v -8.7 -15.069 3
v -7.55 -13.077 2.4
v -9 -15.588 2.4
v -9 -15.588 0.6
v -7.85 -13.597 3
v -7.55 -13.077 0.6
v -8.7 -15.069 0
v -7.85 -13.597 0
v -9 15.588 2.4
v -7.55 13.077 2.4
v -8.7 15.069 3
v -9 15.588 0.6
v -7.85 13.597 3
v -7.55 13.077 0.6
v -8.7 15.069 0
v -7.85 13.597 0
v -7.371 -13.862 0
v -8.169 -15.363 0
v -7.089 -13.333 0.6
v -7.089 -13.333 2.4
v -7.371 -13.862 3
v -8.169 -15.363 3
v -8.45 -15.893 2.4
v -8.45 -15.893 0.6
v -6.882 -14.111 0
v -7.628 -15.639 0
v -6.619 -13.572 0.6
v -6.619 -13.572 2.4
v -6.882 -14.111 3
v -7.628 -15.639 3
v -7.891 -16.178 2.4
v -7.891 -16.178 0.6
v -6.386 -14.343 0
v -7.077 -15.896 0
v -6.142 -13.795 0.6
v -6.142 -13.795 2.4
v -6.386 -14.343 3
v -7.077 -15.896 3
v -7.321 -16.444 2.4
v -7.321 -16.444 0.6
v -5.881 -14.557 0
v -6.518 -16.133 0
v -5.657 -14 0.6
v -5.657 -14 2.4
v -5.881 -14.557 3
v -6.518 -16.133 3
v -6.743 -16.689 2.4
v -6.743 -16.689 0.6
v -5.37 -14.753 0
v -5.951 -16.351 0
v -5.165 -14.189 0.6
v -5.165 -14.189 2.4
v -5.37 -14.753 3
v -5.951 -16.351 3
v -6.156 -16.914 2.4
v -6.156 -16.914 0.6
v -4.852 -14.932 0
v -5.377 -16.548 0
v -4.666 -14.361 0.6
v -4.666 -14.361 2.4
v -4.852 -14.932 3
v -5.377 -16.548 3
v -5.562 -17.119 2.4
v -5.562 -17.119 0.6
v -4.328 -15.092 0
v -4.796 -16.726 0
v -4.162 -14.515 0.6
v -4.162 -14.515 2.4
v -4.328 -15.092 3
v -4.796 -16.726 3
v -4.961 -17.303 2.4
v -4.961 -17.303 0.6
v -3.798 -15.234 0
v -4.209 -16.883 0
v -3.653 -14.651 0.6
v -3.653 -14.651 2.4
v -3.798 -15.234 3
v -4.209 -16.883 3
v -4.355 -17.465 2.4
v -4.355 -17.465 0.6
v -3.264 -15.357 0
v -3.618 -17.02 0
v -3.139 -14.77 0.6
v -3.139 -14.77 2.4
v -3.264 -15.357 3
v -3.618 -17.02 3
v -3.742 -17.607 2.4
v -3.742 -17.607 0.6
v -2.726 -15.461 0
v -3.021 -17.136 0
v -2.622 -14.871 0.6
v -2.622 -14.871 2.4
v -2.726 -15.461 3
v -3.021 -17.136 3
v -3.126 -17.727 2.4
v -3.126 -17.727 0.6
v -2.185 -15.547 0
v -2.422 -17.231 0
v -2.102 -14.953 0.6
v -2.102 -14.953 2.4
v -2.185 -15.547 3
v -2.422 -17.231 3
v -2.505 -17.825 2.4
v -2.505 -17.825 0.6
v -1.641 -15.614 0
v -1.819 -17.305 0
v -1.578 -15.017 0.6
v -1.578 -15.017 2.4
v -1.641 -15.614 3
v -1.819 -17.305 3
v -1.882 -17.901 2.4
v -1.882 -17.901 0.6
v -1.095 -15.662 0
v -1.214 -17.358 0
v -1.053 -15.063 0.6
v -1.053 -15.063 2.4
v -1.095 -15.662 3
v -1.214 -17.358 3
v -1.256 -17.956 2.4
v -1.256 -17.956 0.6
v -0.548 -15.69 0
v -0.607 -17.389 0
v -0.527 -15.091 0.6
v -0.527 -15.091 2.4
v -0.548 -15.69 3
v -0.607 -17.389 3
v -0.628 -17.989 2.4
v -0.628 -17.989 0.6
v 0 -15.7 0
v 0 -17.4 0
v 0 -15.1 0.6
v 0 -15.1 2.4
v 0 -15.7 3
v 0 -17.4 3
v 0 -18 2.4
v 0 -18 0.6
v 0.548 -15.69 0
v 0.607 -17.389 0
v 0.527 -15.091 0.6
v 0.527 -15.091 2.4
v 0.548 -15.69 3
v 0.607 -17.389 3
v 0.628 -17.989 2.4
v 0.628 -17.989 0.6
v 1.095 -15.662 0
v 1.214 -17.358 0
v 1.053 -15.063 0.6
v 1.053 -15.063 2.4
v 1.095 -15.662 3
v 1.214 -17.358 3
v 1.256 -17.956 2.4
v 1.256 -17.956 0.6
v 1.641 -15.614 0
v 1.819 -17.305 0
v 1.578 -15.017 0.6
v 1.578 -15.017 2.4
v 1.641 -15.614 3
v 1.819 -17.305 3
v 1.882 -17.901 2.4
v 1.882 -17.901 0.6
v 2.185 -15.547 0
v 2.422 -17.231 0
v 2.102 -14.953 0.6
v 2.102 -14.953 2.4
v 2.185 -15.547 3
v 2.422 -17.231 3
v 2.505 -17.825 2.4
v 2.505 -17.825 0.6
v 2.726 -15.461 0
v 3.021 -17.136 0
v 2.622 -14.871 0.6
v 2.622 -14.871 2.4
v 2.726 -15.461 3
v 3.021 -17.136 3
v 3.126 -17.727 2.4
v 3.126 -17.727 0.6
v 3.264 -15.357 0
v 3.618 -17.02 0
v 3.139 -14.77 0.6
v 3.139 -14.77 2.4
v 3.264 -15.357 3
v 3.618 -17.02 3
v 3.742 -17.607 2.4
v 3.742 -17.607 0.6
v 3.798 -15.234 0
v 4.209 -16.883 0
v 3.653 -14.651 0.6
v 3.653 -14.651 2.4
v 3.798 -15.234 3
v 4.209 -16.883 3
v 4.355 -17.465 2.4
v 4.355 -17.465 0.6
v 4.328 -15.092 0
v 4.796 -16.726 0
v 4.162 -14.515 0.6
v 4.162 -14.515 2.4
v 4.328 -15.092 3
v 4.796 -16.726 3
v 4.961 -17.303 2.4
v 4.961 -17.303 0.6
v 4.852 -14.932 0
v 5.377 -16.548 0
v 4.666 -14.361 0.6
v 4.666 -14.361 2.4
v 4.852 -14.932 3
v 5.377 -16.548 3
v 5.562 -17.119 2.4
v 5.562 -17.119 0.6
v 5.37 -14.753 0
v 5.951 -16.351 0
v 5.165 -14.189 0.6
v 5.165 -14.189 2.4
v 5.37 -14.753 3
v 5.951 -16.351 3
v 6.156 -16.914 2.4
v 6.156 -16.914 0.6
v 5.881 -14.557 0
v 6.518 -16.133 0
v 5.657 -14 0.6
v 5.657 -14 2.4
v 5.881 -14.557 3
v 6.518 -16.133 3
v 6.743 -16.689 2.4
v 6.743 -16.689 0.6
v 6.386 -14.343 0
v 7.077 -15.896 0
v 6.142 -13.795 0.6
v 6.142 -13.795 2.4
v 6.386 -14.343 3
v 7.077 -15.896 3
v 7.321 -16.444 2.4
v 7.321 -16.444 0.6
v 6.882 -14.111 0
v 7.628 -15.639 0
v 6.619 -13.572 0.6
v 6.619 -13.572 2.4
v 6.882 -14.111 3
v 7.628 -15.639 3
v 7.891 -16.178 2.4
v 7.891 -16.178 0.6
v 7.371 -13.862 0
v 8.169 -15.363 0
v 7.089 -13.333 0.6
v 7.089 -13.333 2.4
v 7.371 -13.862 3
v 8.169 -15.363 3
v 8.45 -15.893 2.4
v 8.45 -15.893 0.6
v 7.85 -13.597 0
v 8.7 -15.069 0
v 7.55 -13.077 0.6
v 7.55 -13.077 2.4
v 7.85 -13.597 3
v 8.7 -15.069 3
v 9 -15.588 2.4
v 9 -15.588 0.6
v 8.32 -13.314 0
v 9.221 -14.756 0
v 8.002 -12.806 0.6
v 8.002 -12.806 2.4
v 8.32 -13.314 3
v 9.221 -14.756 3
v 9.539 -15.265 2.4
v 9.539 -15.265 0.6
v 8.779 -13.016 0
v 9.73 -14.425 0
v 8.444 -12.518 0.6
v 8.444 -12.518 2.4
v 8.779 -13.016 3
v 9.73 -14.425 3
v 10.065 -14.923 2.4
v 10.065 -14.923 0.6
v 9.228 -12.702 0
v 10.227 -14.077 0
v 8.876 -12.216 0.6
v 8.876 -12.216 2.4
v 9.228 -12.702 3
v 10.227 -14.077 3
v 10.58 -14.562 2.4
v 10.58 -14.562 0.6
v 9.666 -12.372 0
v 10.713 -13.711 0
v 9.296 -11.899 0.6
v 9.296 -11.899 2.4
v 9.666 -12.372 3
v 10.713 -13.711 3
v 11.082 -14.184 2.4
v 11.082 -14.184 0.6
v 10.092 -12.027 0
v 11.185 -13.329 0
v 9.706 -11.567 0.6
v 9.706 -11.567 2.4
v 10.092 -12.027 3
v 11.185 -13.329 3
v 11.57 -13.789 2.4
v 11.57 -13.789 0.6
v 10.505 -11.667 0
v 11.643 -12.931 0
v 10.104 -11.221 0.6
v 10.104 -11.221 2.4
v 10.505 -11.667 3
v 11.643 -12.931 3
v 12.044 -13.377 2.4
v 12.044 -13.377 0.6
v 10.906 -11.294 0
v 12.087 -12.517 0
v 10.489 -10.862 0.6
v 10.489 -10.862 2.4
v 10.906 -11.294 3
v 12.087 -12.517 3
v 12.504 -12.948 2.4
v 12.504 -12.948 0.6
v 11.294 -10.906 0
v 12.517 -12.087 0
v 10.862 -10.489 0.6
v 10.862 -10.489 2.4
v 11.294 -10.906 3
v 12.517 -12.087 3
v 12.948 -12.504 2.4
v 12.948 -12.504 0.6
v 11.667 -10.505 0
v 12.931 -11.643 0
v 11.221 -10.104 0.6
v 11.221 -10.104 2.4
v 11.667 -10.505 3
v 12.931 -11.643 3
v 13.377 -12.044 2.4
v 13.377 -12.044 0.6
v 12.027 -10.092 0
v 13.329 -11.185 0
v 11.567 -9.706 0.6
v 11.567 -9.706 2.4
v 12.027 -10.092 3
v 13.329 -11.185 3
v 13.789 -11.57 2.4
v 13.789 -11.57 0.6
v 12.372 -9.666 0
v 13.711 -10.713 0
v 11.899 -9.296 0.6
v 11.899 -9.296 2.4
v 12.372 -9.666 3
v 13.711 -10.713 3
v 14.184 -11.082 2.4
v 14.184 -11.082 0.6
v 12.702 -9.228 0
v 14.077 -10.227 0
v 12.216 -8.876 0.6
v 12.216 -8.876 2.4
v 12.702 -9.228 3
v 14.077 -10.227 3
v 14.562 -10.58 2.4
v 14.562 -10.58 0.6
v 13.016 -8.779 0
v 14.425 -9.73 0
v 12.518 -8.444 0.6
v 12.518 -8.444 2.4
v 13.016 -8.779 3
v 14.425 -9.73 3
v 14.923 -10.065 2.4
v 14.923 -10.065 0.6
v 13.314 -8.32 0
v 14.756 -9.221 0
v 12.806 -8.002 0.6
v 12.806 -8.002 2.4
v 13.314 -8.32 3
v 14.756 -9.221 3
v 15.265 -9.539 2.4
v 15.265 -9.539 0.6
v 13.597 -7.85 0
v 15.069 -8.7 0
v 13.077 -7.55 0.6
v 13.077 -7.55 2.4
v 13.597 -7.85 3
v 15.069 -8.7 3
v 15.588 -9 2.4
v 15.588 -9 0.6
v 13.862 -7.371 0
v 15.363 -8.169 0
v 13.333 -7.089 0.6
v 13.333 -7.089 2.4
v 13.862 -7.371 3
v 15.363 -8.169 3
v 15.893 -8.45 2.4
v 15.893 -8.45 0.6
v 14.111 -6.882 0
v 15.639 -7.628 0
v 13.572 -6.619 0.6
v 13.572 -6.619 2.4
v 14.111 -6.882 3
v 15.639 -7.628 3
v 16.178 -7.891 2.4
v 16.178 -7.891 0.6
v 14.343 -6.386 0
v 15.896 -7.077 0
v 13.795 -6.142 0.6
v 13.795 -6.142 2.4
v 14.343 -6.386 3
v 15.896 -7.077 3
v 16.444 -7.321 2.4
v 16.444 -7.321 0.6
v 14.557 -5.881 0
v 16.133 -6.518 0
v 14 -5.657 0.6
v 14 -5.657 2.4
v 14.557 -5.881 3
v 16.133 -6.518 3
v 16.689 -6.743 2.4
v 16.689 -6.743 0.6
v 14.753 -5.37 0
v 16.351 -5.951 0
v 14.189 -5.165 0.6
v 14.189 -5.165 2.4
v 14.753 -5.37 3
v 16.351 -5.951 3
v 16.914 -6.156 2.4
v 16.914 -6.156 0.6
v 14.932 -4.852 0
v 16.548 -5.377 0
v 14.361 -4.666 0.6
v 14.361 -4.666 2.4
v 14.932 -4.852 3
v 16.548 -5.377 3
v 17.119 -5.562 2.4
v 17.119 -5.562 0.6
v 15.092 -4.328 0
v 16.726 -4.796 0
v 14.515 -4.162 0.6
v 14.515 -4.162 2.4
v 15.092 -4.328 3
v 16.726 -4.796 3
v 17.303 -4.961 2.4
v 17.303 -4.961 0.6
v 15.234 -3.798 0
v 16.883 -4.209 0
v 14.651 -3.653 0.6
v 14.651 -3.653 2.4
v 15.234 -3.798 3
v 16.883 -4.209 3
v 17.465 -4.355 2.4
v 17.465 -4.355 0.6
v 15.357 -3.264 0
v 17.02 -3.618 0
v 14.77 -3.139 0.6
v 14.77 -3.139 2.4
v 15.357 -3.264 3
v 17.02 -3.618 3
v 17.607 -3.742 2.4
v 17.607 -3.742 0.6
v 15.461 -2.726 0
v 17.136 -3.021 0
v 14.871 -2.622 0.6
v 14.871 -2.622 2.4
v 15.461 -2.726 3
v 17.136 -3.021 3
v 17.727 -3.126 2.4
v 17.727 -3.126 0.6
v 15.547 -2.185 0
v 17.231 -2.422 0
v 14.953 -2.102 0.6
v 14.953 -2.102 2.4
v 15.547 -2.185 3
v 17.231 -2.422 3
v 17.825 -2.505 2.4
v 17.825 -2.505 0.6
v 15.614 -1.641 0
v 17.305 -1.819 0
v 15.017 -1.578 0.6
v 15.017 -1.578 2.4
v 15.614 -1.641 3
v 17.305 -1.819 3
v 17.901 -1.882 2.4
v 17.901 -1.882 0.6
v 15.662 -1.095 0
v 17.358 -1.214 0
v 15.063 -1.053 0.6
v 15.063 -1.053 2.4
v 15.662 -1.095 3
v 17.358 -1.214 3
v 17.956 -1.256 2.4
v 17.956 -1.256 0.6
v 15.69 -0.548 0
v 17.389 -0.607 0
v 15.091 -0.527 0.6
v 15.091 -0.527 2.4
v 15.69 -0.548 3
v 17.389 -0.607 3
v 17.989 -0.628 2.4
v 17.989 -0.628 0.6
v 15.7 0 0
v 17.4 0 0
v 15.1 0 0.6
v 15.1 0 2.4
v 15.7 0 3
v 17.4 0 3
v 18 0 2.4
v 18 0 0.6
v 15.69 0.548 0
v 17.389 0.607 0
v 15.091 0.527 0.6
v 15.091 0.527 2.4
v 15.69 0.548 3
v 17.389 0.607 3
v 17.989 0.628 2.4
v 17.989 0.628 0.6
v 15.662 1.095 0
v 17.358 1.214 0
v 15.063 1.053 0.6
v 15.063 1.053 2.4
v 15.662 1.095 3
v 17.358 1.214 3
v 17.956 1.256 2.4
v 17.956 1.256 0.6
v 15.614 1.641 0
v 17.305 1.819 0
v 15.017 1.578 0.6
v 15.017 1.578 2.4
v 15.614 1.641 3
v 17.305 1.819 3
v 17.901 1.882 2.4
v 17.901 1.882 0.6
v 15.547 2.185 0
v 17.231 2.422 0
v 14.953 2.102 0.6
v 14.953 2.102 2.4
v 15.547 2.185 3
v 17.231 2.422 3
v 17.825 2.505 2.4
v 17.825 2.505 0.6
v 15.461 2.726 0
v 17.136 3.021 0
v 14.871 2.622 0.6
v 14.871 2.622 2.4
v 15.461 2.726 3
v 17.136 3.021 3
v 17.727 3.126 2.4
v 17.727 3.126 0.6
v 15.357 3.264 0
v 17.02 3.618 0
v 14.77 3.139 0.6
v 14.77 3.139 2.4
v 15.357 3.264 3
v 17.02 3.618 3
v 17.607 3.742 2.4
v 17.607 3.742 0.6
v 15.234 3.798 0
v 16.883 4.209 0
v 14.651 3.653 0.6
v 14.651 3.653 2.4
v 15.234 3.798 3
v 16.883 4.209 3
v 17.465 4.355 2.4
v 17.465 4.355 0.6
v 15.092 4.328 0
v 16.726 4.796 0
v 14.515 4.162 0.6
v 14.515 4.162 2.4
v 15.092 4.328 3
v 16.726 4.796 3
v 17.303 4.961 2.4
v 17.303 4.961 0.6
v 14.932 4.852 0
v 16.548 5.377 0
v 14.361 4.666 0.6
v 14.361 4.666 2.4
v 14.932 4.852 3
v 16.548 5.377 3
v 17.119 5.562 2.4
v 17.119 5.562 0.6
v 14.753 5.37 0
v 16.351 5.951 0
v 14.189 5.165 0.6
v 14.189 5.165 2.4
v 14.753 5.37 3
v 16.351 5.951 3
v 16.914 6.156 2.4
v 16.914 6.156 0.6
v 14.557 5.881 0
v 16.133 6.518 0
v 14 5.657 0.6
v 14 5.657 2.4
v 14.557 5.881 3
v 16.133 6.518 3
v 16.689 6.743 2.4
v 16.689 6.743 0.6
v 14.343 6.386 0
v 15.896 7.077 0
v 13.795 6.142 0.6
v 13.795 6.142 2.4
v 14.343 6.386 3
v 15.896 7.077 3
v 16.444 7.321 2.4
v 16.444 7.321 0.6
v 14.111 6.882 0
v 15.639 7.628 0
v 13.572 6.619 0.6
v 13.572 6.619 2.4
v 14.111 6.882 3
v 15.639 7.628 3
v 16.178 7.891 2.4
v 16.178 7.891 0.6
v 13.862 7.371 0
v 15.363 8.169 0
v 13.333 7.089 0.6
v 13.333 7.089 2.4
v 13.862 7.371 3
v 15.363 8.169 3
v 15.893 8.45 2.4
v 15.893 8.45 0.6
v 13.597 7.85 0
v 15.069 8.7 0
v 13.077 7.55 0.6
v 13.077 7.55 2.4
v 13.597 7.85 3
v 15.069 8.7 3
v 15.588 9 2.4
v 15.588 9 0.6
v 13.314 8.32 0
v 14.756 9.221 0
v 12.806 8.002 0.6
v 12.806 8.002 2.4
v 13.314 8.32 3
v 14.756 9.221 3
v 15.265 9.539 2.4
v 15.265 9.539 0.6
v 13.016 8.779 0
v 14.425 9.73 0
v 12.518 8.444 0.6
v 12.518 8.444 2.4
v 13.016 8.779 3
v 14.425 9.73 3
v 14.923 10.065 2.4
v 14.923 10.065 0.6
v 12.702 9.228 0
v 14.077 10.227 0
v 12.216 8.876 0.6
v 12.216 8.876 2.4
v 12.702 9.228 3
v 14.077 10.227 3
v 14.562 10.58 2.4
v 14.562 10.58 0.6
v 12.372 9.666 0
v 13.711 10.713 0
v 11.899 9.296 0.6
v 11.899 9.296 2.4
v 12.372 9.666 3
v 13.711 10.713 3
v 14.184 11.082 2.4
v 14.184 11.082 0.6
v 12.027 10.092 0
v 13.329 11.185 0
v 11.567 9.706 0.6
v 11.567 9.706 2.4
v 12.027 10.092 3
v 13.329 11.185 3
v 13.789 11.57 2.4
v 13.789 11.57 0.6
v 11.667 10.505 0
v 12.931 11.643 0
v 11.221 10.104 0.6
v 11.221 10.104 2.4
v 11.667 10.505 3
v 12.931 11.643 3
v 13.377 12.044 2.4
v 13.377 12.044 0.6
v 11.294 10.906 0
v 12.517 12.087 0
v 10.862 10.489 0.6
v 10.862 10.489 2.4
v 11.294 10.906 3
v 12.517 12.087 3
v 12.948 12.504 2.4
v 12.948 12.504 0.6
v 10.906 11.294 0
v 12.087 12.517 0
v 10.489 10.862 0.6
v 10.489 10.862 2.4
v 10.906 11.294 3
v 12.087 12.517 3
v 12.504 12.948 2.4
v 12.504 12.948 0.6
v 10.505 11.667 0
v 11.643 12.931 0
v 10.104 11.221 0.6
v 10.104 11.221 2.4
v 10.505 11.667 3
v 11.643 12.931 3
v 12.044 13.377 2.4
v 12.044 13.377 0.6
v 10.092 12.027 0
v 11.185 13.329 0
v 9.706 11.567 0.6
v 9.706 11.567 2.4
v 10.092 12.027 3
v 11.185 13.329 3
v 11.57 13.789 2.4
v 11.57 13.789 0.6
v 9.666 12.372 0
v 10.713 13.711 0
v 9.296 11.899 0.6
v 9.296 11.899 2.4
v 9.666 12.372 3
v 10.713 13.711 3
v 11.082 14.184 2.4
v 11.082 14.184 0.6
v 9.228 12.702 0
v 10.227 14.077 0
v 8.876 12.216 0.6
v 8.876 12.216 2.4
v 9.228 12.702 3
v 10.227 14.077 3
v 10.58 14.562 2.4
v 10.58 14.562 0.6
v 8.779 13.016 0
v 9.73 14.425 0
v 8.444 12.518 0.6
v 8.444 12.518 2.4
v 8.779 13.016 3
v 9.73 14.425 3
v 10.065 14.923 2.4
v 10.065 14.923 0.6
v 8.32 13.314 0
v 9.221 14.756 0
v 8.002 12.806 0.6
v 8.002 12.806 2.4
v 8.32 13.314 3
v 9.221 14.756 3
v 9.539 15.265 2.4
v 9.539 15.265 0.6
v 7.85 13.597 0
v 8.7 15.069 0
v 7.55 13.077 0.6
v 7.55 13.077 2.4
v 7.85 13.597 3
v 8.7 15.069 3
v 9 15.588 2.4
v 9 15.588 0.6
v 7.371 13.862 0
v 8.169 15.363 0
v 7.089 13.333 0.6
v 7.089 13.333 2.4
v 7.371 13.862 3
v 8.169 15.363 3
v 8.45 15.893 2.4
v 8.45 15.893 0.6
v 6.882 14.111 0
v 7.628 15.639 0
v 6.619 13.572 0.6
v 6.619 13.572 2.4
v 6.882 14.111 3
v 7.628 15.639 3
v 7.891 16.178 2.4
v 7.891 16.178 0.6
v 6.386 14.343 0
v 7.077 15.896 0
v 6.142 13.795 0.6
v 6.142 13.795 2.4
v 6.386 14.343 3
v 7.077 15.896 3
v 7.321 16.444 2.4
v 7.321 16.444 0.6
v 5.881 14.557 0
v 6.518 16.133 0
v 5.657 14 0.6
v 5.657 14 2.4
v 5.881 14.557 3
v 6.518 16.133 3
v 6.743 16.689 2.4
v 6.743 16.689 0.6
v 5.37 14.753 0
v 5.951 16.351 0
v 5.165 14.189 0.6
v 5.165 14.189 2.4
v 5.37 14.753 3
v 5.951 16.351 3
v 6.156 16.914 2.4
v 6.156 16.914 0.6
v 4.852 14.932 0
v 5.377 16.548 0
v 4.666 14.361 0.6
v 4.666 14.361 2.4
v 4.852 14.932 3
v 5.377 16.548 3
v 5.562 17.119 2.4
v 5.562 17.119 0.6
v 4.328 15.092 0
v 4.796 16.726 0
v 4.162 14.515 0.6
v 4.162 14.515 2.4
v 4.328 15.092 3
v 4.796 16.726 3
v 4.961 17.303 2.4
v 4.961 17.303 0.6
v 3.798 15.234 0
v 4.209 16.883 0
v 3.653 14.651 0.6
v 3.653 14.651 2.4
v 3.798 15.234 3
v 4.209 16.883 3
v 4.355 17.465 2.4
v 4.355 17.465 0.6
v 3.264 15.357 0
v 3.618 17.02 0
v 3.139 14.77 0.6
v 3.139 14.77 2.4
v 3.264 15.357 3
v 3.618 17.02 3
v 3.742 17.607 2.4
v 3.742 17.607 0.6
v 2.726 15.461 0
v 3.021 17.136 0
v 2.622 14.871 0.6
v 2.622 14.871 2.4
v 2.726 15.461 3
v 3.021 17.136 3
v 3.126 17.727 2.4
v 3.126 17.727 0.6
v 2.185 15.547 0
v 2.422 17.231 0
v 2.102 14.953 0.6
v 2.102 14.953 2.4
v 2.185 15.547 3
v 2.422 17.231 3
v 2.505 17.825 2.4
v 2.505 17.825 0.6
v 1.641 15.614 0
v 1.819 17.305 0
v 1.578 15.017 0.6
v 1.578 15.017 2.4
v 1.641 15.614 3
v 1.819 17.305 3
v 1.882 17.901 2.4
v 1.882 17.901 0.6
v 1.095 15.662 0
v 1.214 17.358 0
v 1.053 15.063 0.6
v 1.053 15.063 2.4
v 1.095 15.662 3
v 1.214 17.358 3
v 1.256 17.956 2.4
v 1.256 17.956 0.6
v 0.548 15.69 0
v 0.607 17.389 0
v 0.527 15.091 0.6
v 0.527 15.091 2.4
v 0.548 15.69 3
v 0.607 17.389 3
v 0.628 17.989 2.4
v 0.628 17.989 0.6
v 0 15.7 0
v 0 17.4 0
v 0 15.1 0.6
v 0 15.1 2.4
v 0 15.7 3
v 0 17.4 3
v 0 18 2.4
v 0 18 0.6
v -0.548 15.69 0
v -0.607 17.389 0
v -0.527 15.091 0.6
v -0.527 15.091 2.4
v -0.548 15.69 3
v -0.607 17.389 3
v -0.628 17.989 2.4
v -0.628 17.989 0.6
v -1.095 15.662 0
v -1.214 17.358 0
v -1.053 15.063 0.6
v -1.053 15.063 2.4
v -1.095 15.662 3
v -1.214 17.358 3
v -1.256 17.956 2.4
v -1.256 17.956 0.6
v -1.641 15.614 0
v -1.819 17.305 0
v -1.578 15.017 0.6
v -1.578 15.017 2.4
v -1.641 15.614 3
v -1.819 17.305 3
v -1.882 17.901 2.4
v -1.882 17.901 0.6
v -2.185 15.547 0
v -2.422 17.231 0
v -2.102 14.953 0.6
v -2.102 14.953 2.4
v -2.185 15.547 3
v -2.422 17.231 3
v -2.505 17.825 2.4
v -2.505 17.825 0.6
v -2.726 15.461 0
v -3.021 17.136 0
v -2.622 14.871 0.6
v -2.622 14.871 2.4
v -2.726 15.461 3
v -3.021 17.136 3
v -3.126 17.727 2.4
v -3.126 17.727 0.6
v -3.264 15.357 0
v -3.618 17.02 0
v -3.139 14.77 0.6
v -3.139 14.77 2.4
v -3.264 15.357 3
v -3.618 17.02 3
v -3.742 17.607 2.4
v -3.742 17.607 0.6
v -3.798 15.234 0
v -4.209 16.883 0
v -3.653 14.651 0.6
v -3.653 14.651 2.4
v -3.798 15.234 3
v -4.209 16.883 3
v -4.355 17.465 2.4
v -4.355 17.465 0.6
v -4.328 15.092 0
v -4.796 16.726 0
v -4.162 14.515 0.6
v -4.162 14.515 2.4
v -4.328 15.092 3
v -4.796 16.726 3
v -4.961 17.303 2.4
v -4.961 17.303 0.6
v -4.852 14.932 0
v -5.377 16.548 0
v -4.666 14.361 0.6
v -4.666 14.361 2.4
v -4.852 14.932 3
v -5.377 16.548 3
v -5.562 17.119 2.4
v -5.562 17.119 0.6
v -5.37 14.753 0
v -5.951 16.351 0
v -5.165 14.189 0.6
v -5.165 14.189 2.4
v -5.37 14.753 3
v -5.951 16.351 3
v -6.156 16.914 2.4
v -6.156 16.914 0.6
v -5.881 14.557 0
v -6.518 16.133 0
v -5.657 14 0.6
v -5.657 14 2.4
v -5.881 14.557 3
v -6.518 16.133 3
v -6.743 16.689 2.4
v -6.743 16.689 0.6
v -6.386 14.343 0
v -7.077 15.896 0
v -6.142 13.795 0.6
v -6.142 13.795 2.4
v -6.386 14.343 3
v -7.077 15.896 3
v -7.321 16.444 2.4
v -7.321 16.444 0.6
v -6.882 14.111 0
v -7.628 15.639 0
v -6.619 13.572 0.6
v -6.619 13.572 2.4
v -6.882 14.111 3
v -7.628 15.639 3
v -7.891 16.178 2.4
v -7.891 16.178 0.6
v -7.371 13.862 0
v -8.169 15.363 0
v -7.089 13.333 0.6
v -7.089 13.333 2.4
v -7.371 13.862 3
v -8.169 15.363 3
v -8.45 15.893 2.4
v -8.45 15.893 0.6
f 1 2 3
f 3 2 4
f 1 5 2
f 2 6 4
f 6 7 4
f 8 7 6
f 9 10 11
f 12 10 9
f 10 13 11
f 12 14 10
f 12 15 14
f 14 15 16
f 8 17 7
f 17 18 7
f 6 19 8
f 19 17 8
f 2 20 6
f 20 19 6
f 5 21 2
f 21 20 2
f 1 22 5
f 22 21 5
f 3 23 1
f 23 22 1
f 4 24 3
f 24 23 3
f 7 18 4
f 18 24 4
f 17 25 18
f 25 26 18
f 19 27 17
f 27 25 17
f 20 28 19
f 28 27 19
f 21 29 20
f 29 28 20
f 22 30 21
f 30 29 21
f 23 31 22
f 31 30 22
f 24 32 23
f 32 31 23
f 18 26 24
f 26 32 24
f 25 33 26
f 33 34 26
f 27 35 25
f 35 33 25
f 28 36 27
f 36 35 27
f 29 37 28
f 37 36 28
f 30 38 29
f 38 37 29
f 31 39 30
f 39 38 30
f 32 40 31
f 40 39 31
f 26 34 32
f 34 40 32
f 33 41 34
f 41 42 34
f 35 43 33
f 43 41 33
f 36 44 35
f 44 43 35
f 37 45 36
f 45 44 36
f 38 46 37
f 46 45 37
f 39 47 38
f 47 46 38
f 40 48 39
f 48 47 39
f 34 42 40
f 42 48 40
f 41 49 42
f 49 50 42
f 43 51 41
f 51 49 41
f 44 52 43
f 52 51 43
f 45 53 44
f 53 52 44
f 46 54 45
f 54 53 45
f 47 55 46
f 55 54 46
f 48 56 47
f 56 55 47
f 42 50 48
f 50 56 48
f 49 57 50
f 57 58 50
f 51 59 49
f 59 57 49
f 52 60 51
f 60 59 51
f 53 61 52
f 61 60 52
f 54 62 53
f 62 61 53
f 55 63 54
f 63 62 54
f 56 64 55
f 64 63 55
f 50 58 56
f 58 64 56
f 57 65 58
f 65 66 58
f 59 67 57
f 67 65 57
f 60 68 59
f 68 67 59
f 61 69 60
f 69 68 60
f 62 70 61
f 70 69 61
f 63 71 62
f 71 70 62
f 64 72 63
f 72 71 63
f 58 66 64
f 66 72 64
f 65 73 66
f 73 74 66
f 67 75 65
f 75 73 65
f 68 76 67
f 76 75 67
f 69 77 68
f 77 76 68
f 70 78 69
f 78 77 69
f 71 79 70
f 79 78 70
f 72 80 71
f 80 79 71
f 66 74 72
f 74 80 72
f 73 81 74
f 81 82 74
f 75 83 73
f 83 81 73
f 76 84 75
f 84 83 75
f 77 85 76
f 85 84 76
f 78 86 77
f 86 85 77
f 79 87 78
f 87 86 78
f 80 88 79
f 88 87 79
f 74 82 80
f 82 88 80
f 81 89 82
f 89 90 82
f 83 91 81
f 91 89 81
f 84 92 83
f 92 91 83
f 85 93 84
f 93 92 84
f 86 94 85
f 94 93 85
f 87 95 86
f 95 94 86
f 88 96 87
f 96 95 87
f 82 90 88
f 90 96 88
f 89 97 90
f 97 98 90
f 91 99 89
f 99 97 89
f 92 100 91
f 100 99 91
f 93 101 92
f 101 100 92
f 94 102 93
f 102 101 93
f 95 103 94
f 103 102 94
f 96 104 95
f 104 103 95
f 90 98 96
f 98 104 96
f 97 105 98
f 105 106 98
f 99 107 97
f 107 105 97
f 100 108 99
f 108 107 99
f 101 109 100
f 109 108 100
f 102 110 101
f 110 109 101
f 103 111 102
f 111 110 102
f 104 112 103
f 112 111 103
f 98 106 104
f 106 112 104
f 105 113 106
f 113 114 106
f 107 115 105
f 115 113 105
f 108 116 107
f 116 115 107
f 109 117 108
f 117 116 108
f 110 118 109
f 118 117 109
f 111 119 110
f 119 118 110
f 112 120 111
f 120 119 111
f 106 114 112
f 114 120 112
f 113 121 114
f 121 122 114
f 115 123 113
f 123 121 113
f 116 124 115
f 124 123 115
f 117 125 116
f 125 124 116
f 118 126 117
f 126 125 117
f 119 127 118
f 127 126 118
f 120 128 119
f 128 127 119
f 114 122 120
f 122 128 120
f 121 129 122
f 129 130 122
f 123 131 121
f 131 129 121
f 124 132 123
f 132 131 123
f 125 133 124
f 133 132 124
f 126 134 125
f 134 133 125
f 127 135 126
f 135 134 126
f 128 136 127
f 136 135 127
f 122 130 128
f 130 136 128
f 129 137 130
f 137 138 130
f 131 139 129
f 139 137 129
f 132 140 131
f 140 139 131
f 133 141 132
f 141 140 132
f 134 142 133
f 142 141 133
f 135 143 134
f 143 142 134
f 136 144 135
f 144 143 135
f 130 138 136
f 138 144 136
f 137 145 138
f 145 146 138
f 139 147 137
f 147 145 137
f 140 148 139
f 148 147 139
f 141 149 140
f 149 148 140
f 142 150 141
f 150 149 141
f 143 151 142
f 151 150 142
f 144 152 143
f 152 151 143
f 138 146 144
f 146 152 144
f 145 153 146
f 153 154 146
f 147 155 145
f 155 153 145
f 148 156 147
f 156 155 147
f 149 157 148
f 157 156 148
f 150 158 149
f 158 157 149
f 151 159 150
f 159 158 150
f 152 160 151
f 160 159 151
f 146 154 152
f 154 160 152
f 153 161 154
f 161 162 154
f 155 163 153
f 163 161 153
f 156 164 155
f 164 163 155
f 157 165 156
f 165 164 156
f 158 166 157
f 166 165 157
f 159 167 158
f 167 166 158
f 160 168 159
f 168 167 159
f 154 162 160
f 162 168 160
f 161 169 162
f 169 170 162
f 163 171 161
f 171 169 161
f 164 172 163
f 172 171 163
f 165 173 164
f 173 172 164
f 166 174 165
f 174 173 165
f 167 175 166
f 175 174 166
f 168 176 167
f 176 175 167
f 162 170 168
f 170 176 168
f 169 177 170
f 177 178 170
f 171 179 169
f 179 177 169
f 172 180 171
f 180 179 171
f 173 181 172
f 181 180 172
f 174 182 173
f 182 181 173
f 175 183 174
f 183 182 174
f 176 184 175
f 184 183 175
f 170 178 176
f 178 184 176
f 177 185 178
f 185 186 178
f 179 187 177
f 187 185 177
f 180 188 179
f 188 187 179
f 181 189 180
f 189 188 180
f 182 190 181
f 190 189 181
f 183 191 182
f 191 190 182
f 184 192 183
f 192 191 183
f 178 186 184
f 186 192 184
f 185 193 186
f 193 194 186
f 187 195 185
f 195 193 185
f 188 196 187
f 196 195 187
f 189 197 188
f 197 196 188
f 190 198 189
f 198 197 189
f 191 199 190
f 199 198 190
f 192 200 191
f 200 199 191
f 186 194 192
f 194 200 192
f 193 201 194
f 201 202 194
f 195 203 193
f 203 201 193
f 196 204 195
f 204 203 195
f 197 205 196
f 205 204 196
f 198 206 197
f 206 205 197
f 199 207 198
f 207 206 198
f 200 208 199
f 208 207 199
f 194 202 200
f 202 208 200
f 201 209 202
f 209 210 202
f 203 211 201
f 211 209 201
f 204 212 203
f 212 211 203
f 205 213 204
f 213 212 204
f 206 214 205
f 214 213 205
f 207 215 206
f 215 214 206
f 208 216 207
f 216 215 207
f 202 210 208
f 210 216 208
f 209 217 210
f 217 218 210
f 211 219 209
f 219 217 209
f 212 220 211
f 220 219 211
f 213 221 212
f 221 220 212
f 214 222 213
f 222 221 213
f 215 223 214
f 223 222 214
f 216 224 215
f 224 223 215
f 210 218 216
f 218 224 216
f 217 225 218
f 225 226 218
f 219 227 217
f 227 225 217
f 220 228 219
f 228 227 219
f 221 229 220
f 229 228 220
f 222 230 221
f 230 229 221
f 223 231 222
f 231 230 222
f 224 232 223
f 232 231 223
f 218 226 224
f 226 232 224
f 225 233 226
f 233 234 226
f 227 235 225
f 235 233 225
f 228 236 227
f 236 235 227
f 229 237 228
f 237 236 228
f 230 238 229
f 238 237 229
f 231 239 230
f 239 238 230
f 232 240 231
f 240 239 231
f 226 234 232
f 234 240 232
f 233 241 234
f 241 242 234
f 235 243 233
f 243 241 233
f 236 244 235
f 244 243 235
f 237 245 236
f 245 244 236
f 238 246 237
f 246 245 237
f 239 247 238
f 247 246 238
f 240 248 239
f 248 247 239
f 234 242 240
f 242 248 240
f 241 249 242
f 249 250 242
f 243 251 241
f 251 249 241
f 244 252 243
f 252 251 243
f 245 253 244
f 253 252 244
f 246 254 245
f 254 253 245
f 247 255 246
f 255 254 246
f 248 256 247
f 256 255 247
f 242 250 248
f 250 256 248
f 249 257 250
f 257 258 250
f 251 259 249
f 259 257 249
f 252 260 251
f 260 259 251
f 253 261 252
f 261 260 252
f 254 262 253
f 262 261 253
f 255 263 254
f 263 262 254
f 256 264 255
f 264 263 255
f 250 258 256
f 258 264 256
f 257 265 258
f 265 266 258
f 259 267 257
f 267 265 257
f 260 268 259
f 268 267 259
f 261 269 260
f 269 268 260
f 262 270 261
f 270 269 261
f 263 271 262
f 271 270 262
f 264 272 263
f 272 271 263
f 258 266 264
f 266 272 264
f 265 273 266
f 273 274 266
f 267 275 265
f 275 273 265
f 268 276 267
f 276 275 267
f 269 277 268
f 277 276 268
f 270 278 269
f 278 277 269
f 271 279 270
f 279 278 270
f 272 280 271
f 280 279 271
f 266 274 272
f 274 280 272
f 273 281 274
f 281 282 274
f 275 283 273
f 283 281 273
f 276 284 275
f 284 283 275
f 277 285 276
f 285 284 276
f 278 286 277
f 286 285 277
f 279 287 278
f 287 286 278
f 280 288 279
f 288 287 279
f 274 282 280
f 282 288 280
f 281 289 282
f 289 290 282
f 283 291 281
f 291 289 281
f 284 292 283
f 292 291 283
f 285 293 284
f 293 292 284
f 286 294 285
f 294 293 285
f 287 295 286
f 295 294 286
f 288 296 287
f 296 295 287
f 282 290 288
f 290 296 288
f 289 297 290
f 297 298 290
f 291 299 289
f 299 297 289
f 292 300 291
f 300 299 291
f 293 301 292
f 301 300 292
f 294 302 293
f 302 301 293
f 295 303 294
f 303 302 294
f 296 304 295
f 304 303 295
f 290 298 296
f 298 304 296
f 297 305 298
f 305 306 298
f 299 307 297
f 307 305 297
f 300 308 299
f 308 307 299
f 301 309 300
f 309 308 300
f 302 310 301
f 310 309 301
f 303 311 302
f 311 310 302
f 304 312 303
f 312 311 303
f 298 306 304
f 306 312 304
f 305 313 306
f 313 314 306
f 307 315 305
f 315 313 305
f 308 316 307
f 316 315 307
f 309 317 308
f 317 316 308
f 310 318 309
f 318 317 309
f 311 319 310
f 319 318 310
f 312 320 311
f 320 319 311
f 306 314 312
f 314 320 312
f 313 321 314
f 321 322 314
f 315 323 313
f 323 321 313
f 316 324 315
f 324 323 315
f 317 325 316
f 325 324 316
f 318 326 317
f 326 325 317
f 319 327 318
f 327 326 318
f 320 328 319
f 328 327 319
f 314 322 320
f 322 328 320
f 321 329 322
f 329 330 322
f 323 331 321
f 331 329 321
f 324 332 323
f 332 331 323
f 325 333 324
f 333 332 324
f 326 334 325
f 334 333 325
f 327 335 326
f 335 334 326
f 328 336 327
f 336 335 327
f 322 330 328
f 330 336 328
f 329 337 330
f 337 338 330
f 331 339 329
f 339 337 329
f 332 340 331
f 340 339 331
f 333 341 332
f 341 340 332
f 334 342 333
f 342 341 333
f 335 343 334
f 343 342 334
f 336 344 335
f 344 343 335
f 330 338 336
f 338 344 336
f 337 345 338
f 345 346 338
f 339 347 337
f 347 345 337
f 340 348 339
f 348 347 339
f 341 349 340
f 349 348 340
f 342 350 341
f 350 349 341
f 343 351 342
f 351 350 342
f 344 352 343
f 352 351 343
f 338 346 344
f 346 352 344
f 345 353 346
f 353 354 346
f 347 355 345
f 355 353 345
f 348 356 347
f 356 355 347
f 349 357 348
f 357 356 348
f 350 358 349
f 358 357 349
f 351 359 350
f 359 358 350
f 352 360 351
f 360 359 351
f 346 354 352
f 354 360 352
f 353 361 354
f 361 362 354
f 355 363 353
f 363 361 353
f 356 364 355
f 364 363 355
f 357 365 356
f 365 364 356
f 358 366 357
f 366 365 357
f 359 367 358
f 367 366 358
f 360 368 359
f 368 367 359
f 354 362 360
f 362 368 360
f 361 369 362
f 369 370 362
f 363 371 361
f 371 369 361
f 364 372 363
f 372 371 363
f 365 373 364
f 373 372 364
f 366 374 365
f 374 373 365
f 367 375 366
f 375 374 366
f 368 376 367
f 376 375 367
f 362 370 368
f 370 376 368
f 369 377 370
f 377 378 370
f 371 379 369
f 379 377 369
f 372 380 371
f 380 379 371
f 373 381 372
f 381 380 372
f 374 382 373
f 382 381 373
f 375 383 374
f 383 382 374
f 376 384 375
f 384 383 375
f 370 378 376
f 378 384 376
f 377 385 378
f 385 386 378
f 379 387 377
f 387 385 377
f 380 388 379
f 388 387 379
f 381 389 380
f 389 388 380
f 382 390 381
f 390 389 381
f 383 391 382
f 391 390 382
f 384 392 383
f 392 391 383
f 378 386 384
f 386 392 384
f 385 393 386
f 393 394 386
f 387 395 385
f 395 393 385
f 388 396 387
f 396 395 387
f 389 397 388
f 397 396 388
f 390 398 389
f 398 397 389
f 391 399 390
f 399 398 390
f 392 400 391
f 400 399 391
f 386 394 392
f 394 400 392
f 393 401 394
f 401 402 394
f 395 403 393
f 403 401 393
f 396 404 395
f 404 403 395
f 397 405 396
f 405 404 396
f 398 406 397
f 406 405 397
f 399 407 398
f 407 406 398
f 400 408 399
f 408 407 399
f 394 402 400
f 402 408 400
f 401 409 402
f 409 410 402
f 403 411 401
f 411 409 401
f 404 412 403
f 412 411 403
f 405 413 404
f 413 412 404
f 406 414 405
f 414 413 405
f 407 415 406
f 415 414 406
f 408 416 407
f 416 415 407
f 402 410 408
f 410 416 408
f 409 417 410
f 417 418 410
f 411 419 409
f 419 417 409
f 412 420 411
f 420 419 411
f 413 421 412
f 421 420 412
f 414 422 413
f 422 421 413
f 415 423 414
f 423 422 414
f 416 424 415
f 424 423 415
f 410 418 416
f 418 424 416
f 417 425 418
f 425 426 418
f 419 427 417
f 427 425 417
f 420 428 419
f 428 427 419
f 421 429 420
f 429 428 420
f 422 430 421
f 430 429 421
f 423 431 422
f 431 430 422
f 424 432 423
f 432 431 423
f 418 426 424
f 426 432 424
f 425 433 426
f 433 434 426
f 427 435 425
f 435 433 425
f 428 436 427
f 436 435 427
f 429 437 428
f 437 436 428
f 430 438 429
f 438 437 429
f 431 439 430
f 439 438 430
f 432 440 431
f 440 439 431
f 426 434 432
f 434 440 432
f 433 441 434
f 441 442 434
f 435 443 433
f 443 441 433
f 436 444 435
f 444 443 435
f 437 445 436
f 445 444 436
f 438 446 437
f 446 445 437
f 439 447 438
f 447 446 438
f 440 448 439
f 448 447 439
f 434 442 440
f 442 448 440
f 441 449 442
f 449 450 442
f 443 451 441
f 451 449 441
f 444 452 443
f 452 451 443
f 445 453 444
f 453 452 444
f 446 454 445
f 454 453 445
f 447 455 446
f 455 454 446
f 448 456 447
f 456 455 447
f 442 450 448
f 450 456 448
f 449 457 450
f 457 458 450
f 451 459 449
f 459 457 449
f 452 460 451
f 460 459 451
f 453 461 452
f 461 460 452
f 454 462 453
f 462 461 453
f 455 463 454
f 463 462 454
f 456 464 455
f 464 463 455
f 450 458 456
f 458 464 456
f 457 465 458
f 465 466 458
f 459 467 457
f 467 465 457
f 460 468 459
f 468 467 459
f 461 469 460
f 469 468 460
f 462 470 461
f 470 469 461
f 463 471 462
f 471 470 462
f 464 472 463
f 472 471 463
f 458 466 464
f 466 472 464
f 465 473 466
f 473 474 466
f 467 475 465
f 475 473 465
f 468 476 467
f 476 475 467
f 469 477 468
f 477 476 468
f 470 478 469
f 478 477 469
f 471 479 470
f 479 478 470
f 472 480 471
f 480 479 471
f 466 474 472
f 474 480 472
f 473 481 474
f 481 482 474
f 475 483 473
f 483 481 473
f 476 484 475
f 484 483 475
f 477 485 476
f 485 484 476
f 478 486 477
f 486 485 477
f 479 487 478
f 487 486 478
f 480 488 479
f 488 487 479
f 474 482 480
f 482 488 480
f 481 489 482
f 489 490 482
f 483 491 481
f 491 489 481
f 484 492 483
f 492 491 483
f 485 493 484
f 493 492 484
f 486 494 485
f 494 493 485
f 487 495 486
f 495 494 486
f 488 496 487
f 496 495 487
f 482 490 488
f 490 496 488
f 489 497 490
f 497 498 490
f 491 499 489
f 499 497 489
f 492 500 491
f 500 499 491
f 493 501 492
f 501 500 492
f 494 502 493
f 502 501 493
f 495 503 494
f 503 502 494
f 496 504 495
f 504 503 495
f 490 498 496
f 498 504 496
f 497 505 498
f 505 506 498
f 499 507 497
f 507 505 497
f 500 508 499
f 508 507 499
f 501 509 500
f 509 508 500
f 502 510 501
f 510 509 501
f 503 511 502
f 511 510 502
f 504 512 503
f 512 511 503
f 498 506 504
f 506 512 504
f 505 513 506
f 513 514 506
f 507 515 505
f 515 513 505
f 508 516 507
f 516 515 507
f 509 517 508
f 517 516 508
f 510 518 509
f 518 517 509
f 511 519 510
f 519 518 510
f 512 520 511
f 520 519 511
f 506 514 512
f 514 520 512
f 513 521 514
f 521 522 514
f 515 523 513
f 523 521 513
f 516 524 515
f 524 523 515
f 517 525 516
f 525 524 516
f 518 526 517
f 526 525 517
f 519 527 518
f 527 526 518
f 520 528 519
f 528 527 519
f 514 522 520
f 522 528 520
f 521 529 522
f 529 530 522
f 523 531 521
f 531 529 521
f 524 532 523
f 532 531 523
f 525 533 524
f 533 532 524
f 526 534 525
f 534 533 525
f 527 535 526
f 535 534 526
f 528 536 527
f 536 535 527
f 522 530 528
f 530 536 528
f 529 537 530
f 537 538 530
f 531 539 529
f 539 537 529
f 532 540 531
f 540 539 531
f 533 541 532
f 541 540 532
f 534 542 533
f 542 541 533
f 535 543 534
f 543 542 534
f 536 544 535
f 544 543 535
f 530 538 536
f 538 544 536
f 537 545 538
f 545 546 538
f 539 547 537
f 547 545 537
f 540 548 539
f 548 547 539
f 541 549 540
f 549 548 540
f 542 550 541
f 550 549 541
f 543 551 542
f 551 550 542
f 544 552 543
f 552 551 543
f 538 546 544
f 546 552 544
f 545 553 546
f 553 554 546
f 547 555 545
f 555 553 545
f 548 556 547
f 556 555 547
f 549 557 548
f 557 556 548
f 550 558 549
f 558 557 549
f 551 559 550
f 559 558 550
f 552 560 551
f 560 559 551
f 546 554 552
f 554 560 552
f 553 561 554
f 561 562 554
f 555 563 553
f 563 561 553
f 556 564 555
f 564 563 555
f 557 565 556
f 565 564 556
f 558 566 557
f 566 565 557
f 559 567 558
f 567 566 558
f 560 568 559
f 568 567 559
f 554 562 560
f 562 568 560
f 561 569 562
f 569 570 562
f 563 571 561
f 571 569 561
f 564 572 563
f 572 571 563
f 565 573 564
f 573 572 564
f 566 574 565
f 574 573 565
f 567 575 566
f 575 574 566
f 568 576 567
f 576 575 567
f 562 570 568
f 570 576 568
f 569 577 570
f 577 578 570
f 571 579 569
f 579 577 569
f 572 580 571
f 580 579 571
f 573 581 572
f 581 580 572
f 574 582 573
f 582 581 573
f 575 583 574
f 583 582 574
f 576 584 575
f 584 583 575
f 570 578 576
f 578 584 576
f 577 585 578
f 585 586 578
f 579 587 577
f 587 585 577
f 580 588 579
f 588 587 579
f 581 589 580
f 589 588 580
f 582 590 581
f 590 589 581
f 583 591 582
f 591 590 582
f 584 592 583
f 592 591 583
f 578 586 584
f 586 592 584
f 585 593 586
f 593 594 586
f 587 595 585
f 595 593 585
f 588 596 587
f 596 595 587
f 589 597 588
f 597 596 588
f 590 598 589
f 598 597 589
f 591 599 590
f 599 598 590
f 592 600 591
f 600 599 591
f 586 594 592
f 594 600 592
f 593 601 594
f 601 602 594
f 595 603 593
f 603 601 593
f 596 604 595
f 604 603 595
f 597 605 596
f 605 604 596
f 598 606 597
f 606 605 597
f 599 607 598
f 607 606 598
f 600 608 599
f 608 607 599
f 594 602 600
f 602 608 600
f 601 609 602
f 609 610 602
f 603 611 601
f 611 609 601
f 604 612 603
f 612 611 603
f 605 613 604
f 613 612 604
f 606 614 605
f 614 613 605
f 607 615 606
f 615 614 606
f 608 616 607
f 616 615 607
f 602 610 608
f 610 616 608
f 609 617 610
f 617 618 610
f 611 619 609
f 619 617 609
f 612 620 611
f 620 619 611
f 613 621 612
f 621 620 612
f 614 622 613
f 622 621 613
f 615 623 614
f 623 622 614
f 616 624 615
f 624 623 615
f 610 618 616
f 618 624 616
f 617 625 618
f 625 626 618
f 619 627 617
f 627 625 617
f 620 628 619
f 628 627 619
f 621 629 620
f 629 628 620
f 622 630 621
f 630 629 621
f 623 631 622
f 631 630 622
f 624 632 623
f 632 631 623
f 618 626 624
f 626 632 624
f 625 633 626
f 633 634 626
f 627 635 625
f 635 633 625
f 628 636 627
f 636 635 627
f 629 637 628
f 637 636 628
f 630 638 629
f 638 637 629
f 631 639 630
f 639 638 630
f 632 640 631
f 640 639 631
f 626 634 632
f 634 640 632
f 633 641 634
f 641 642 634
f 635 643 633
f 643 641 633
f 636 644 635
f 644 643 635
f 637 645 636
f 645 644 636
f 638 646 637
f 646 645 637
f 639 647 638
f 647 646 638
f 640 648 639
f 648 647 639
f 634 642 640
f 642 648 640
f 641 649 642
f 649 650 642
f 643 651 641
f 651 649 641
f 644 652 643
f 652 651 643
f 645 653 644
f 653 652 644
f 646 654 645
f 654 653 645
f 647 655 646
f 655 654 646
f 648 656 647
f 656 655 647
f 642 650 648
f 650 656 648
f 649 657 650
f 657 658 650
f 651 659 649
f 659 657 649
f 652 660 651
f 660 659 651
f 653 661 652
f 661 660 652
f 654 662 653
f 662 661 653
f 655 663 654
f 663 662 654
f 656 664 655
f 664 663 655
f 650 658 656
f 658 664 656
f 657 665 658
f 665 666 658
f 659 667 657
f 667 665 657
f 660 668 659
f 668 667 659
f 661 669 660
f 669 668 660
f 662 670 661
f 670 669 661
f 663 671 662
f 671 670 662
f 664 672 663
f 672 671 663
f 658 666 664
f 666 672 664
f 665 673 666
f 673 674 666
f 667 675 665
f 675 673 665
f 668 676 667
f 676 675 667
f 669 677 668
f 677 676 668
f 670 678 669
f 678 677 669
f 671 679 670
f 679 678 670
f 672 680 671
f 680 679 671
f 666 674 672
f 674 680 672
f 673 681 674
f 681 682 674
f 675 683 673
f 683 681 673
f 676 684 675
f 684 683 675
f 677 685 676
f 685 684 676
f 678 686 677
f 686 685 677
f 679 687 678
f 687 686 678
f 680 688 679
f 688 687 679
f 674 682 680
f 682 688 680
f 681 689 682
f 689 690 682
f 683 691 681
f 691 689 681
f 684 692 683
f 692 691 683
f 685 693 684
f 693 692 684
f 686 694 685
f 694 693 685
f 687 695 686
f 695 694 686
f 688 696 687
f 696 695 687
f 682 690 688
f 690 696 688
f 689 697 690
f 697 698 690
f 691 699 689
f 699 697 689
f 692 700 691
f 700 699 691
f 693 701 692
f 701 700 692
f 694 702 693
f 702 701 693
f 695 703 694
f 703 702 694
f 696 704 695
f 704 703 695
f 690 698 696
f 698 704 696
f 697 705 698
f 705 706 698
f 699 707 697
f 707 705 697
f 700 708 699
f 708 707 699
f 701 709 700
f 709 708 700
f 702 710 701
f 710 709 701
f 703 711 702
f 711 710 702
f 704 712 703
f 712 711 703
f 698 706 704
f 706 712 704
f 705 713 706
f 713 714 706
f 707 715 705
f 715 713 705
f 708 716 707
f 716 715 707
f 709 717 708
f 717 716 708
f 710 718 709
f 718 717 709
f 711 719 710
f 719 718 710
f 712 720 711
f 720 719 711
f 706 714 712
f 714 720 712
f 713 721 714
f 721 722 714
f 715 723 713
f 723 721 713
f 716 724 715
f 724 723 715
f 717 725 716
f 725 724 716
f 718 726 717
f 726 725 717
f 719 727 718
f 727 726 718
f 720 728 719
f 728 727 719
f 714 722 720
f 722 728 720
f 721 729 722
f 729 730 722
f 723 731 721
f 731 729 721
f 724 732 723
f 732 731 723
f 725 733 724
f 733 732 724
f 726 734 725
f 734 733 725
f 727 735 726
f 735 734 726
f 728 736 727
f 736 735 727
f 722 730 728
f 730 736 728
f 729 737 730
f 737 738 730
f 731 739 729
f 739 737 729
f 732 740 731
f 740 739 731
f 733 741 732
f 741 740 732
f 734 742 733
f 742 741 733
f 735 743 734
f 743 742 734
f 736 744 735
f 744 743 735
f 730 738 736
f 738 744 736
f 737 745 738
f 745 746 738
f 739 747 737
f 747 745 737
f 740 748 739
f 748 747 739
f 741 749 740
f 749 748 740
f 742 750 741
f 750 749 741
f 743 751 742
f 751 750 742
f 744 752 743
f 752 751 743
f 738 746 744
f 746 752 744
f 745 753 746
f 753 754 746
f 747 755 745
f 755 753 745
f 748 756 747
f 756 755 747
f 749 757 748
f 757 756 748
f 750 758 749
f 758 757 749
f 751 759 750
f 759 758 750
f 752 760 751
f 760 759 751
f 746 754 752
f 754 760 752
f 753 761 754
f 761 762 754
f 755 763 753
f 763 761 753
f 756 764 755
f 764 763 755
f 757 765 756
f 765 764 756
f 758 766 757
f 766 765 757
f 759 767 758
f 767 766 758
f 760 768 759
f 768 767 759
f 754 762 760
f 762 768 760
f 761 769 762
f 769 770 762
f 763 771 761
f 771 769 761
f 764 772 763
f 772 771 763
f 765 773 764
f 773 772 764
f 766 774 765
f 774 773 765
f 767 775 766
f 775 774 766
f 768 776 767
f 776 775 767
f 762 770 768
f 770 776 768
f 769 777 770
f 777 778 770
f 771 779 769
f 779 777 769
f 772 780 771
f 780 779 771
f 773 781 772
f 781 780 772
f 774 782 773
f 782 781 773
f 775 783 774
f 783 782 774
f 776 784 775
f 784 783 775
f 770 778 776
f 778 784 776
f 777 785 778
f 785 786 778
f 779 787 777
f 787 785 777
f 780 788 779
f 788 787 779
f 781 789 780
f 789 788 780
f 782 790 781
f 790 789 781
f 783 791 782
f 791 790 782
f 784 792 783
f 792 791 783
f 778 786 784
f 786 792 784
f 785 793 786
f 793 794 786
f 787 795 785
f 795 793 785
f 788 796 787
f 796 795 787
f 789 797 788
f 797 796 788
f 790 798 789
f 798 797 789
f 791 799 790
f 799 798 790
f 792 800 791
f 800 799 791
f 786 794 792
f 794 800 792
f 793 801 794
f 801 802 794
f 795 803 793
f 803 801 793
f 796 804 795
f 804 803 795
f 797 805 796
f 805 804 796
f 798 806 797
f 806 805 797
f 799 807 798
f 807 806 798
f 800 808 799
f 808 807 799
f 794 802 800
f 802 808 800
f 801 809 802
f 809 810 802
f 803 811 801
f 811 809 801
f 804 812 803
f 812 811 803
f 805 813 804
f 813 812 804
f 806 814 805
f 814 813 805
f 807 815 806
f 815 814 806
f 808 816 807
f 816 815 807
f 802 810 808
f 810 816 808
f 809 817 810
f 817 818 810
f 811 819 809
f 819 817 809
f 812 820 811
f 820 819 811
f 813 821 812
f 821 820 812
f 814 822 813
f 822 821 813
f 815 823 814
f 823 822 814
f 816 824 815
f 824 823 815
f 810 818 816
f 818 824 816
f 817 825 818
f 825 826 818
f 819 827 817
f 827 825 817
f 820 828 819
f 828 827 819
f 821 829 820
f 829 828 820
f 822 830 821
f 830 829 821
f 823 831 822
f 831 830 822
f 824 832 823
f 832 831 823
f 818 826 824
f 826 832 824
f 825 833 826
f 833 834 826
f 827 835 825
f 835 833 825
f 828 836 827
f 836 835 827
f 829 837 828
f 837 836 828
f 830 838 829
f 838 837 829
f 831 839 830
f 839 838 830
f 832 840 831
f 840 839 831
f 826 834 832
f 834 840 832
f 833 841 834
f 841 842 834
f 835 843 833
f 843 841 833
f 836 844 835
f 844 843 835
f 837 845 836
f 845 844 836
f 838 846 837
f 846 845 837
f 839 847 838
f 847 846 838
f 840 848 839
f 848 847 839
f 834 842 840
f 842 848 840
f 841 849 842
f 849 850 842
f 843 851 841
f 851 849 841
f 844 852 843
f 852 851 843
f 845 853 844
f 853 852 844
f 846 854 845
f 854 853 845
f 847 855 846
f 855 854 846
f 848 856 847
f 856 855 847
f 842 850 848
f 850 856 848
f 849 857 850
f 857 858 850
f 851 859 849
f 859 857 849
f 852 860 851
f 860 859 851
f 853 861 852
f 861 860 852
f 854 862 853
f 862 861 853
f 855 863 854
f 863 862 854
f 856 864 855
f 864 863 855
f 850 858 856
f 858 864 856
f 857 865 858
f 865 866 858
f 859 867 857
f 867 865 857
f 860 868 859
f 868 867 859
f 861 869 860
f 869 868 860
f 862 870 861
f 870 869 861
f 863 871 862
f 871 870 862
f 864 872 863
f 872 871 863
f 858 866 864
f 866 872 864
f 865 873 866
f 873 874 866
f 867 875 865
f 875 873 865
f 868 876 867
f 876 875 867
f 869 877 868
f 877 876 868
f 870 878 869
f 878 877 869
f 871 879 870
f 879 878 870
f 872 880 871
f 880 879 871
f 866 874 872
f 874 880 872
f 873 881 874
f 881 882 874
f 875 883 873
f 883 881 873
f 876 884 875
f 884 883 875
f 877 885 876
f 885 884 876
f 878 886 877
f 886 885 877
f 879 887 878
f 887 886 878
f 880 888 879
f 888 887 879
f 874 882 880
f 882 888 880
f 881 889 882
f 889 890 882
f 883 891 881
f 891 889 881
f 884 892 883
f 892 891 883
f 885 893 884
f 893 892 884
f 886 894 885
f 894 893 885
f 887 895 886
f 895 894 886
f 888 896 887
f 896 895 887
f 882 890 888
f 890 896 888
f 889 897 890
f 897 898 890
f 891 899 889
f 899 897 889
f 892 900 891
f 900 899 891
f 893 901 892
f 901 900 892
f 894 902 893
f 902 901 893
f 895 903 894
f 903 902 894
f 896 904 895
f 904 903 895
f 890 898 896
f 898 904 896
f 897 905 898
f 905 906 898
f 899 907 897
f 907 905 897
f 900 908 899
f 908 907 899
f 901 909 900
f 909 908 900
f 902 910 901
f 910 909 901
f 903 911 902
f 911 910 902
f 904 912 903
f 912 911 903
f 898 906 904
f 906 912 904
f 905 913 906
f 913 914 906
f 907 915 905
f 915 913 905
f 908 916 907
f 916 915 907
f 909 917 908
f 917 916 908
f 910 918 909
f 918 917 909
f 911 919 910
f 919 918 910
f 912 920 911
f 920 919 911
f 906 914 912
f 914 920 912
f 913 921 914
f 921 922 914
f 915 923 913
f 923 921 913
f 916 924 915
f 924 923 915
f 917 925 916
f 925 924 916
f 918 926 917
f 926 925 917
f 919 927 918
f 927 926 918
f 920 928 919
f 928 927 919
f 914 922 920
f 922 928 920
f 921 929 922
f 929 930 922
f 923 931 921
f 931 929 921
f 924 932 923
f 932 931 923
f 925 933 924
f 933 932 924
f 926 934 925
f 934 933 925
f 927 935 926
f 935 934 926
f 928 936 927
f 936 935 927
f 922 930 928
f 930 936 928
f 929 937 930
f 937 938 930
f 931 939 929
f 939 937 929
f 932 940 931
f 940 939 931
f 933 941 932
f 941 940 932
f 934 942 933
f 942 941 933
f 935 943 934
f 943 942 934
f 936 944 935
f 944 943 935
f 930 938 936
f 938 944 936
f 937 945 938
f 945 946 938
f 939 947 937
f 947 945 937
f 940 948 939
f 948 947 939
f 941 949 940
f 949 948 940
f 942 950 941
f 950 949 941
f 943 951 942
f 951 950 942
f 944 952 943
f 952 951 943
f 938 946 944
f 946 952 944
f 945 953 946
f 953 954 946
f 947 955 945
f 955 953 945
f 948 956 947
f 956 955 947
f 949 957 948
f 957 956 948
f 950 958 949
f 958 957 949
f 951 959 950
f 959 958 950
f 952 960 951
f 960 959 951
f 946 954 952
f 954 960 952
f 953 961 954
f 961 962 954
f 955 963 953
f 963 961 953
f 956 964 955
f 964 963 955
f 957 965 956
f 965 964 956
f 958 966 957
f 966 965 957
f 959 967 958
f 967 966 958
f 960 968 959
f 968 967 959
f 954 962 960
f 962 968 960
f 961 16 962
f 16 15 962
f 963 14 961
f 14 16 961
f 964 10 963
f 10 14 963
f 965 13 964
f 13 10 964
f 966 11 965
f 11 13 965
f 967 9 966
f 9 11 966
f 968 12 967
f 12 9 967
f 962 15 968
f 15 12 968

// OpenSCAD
// Distanz-Clip fuer Geberit Heberglocke (AV02 / 5200.017) – parametrisch
// Oeffnen mit OpenSCAD (openscad.org) oder MakerWorld "Parametric Model Maker",
// Werte anpassen, F6 (Render), dann F7 (Export als STL).

innen_d  = 30;   // Innendurchmesser = Rohrdurchmesser [mm]
aussen_d = 36;   // Aussendurchmesser [mm]
hoehe    = 3;    // Hoehe / Dicke [mm]
spiel    = 0.2;  // Druckertoleranz auf den Innendurchmesser [mm]
variante = "C";  // "C" = C-Clip (Schnappclip), "H" = 2 Halbschalen
c_winkel = 240;  // Umschlingung des C-Clips in Grad (>180 = schnappt ein)
fase     = 0.6;  // Kantenfase [mm]

$fn = 180;
ri = (innen_d + spiel) / 2;
ro = aussen_d / 2;

module profil() {
    c = min(fase, (ro - ri) / 3, hoehe / 3);
    polygon([[ri+c,0],[ro-c,0],[ro,c],[ro,hoehe-c],[ro-c,hoehe],
             [ri+c,hoehe],[ri,hoehe-c],[ri,c]]);
}
module segment(w) rotate([0,0,-w/2]) rotate_extrude(angle = w) profil();

if (variante == "C") {
    segment(c_winkel);
} else {
    translate([-2, 0, 0]) rotate([0,0,180]) segment(179);
    translate([ 2, 0, 0]) segment(179);
}
